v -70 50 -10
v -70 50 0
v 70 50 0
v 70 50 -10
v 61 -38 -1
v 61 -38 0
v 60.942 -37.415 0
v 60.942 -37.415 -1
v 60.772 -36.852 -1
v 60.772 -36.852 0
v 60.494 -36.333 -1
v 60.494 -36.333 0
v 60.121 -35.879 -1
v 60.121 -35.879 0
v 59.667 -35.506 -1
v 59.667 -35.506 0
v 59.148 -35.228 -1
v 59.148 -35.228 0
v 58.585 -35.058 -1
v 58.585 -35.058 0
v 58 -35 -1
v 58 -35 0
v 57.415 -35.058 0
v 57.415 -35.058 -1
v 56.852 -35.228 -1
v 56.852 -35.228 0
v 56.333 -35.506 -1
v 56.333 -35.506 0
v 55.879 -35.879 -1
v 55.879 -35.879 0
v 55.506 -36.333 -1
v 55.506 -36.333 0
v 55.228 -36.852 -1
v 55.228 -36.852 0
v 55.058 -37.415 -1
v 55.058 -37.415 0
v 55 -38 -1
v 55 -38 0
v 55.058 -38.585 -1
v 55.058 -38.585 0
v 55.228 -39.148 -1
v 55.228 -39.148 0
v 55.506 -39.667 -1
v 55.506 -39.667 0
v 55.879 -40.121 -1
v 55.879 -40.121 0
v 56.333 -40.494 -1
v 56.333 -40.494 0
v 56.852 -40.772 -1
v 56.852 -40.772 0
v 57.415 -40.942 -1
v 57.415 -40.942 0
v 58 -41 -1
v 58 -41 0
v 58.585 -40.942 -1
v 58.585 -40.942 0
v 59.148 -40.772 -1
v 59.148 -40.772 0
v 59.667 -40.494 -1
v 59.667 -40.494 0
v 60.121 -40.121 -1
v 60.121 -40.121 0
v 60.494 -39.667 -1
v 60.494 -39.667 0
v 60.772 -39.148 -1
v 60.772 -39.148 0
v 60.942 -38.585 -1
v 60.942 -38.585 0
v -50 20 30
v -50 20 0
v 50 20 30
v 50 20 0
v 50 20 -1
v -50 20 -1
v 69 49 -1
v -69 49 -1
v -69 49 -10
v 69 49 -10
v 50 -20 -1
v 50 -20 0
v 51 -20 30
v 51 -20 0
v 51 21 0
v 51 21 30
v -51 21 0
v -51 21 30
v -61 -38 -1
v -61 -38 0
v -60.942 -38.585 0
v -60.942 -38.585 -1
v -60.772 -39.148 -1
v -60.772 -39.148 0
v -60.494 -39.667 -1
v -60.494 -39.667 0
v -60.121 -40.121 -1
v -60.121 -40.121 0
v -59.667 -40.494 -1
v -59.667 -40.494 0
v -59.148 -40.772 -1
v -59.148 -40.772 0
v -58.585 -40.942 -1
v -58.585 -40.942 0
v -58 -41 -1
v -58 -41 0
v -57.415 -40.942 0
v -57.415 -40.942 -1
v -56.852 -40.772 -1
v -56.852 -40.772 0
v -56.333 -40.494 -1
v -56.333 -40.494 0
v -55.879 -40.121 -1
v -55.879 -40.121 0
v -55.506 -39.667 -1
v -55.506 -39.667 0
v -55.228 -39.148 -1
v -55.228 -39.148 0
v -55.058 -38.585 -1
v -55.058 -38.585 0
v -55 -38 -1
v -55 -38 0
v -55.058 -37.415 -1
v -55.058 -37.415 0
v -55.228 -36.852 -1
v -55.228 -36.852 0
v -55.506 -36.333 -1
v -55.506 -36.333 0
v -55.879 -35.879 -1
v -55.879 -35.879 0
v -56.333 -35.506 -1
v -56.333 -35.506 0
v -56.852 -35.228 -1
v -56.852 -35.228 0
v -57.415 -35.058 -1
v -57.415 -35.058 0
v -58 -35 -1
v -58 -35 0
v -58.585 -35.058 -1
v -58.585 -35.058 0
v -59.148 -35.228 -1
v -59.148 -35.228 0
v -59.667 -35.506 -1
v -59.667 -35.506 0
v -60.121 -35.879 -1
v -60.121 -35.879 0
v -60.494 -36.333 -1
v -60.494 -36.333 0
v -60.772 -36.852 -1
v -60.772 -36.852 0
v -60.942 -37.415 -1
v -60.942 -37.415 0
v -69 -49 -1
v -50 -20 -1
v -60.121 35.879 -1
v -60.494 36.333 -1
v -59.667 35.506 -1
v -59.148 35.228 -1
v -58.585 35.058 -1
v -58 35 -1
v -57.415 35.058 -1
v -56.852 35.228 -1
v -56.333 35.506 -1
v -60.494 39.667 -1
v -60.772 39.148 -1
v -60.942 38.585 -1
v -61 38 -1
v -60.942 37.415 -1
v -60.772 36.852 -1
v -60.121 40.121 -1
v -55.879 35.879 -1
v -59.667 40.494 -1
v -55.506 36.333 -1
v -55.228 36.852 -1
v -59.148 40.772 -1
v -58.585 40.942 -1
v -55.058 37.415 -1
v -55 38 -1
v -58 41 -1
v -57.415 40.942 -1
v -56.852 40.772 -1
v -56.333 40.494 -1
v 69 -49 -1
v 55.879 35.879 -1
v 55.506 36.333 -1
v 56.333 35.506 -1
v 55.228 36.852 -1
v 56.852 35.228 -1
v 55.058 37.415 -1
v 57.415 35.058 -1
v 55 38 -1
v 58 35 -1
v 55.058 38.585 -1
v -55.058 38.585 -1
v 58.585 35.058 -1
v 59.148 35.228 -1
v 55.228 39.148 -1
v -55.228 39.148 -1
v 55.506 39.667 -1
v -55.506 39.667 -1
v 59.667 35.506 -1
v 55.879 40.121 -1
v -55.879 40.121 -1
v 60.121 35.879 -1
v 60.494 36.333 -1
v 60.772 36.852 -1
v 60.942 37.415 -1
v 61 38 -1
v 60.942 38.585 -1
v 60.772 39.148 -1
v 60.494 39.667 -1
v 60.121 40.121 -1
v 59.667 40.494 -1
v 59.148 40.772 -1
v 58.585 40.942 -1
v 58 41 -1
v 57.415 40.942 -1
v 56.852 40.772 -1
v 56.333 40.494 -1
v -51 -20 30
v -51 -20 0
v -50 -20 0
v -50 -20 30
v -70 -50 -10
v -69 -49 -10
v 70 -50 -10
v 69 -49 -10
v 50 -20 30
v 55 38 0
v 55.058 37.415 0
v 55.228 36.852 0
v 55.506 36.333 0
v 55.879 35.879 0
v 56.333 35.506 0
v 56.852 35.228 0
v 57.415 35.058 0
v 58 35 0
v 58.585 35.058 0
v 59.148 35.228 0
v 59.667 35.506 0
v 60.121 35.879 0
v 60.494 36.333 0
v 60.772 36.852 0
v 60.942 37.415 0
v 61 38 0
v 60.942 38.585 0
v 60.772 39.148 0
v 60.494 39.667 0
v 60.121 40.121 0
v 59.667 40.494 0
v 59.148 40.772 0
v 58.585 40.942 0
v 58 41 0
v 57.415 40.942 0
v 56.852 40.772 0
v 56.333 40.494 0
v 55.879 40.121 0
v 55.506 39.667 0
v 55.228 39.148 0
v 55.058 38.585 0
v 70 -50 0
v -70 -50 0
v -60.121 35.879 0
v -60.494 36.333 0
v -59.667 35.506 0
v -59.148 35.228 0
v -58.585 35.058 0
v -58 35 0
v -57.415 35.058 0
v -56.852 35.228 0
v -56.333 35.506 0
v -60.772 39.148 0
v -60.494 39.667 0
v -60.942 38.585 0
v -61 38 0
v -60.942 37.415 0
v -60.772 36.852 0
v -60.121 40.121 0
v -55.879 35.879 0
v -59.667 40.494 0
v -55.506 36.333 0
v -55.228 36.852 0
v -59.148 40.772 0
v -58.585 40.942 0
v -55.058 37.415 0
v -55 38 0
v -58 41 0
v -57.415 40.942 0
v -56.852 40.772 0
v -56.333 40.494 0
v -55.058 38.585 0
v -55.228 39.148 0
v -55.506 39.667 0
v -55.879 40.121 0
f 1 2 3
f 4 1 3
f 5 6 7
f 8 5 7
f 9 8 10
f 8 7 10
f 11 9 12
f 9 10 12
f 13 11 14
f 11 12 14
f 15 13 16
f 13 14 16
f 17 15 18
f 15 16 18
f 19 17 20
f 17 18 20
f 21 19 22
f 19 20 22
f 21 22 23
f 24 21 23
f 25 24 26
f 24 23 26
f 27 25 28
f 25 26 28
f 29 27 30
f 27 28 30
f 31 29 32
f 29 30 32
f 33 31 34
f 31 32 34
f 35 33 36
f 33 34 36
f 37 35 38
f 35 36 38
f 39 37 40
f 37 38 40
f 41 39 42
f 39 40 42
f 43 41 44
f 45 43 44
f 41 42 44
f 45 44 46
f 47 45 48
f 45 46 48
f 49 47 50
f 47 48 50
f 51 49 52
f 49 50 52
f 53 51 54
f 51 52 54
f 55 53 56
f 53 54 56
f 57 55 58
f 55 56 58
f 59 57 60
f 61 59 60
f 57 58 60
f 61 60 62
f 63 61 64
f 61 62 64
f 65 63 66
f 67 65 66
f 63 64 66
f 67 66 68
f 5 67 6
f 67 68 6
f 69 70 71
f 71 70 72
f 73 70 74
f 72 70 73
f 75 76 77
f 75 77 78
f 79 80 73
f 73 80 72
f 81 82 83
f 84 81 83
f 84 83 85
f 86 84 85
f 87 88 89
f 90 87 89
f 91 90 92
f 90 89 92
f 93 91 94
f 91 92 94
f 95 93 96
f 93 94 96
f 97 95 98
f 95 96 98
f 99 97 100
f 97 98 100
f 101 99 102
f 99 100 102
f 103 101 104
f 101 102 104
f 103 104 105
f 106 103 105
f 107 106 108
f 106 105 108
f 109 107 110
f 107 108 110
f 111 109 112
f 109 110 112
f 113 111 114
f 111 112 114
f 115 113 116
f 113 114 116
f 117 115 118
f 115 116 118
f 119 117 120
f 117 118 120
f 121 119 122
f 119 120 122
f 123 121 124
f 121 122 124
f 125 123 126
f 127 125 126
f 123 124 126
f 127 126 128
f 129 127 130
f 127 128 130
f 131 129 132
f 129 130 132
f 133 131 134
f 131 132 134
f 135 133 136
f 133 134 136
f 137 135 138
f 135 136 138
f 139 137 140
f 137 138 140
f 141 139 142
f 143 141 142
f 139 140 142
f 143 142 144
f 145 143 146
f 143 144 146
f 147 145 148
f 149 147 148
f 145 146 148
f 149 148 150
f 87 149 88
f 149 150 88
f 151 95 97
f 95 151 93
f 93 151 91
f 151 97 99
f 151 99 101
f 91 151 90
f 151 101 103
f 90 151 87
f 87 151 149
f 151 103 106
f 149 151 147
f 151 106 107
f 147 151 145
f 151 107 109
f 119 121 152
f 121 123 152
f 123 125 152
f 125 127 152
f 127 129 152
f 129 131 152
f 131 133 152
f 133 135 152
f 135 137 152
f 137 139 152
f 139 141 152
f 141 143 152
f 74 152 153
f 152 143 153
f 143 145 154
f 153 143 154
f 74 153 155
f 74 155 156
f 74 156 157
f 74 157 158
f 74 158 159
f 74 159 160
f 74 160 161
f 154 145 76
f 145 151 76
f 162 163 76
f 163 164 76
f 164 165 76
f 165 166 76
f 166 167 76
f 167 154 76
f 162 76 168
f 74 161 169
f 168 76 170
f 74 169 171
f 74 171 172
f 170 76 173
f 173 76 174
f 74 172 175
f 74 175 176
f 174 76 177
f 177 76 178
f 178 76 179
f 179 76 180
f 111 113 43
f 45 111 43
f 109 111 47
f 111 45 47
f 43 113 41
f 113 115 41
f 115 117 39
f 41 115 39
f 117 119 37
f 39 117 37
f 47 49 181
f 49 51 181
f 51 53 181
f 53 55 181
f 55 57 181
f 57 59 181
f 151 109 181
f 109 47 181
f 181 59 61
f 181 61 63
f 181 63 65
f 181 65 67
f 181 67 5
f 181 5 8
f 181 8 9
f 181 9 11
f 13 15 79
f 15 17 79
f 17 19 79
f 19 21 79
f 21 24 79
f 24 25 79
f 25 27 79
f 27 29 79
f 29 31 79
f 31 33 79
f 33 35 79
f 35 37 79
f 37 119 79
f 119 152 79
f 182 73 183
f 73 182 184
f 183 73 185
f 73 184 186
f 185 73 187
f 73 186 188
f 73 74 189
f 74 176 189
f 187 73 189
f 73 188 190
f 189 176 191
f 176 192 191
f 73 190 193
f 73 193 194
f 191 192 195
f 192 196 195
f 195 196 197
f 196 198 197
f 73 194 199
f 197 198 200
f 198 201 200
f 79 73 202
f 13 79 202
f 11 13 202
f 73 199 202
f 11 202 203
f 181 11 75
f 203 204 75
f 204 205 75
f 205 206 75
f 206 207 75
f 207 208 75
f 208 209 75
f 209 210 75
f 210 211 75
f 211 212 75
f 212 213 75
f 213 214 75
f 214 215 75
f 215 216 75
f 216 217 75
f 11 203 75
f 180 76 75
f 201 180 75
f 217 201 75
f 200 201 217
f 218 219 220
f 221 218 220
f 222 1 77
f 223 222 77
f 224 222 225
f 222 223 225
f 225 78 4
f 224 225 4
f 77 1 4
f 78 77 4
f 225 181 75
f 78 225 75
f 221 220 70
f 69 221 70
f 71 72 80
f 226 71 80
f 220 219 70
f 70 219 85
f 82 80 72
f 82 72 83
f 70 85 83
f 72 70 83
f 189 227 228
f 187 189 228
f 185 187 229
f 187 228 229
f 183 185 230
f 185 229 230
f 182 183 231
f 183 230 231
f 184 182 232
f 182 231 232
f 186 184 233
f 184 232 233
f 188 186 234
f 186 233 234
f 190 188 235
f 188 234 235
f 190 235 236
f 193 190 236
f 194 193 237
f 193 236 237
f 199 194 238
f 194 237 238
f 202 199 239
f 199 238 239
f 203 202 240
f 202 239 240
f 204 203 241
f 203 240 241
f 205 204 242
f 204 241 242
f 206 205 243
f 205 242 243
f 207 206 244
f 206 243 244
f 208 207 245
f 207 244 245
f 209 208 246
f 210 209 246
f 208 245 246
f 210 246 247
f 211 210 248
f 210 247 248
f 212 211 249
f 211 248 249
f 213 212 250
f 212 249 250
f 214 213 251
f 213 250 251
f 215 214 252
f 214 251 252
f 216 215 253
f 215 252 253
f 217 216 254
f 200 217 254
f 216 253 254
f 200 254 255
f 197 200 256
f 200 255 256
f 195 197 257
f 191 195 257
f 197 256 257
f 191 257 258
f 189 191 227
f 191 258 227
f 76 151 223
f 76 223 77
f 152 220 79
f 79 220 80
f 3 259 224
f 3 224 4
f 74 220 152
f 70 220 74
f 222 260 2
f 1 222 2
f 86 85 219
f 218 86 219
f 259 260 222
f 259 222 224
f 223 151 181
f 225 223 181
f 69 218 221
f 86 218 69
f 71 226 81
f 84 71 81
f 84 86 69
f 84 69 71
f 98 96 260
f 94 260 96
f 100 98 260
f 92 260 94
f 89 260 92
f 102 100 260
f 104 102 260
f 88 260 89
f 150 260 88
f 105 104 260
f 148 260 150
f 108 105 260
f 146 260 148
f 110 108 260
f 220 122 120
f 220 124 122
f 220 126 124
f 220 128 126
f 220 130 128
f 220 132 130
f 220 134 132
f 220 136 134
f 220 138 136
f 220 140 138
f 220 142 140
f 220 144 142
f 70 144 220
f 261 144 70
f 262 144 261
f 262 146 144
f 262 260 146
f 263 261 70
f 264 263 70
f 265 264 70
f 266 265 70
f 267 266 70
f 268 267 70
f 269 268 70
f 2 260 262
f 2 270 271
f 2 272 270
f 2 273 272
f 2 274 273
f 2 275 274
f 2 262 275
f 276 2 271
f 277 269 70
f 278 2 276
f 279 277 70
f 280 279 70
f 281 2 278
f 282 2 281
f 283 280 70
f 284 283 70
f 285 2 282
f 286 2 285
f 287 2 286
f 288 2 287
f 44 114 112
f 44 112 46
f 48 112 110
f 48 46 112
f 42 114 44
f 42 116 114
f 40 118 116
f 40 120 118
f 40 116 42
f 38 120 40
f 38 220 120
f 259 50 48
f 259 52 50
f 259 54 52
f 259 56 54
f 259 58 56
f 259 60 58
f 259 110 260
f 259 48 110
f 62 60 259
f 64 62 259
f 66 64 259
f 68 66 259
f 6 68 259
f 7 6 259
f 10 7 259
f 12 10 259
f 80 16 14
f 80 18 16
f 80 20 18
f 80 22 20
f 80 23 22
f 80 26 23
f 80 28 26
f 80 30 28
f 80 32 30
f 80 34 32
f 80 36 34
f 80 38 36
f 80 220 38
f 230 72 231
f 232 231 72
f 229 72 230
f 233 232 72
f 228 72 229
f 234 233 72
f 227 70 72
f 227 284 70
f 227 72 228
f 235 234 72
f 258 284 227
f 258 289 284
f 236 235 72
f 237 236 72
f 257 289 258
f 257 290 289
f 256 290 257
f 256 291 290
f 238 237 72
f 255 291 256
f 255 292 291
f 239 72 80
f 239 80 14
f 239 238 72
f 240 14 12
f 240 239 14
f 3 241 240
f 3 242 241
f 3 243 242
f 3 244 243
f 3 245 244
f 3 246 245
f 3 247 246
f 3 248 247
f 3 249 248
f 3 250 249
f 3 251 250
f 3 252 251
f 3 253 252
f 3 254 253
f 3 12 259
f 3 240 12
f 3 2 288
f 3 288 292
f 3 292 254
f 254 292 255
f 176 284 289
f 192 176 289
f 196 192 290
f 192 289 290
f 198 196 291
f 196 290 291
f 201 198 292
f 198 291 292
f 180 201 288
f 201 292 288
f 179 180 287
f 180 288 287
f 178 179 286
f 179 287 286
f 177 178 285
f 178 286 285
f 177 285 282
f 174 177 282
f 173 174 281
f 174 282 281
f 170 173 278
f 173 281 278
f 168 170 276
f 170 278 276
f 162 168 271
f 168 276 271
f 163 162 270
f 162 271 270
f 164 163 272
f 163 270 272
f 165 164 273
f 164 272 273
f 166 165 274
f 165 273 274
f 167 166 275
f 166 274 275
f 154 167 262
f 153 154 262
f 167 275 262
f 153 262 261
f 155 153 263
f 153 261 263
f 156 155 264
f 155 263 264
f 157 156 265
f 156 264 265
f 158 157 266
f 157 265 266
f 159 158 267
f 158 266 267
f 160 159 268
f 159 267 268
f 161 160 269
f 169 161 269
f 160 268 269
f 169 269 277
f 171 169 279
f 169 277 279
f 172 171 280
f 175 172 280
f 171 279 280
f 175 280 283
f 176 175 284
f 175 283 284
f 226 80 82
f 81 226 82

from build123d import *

# Parameters (mm, degrees)
CROQUIS1_W              = 140
CROQUIS1_H              = 100
CROQUIS1_W_2            = 138
CROQUIS1_H_2            = 98
SALIENTE_EXTRUIR1_DEPTH = 10
CROQUIS2_W              = 138
CROQUIS2_H              = 98
SALIENTE_EXTRUIR2_DEPTH = 1
CROQUIS4_R              = 3
CROQUIS4_W              = 100
CROQUIS4_H              = 40
CORTAR_EXTRUIR1_DEPTH   = 1
SALIENTE_EXTRUIR3_DEPTH = 30


with BuildPart() as part:
    # Croquis1 → Saliente-Extruir1 (new body)
    with BuildSketch(Plane.XY):
        Rectangle(CROQUIS1_W, CROQUIS1_H)
        Rectangle(CROQUIS1_W_2, CROQUIS1_H_2, mode=Mode.SUBTRACT)
    extrude(amount=-SALIENTE_EXTRUIR1_DEPTH)

    # Croquis2 → Saliente-Extruir2 (add)
    with BuildSketch(Plane.XY):
        Rectangle(CROQUIS2_W, CROQUIS2_H)
    extrude(amount=-SALIENTE_EXTRUIR2_DEPTH)

    # Croquis4 → Cortar-Extruir1 (cut)
    with BuildSketch(Plane.XY):
        with Locations((-58, 38)):
            Circle(CROQUIS4_R)
        with Locations(Location((58, 38, 0), (0, 0, 180))):
            Circle(CROQUIS4_R)
        with Locations((58, -38)):
            Circle(CROQUIS4_R)
        with Locations(Location((-58, -38, 0), (0, 0, 180))):
            Circle(CROQUIS4_R)
        Rectangle(CROQUIS4_W, CROQUIS4_H)
    extrude(amount=-CORTAR_EXTRUIR1_DEPTH, mode=Mode.SUBTRACT)


with BuildPart() as body_2:
    # Croquis5 → Saliente-Extruir3 (new body)
    with BuildSketch(Plane.XY):
        Polygon((-50, -20), (-50, 20), (50, 20), (50, -20), (51, -20), (51, 21), (-51, 21), (-51, -20), align=None)
    extrude(amount=SALIENTE_EXTRUIR3_DEPTH)


solid = Compound([part.part, body_2.part])
